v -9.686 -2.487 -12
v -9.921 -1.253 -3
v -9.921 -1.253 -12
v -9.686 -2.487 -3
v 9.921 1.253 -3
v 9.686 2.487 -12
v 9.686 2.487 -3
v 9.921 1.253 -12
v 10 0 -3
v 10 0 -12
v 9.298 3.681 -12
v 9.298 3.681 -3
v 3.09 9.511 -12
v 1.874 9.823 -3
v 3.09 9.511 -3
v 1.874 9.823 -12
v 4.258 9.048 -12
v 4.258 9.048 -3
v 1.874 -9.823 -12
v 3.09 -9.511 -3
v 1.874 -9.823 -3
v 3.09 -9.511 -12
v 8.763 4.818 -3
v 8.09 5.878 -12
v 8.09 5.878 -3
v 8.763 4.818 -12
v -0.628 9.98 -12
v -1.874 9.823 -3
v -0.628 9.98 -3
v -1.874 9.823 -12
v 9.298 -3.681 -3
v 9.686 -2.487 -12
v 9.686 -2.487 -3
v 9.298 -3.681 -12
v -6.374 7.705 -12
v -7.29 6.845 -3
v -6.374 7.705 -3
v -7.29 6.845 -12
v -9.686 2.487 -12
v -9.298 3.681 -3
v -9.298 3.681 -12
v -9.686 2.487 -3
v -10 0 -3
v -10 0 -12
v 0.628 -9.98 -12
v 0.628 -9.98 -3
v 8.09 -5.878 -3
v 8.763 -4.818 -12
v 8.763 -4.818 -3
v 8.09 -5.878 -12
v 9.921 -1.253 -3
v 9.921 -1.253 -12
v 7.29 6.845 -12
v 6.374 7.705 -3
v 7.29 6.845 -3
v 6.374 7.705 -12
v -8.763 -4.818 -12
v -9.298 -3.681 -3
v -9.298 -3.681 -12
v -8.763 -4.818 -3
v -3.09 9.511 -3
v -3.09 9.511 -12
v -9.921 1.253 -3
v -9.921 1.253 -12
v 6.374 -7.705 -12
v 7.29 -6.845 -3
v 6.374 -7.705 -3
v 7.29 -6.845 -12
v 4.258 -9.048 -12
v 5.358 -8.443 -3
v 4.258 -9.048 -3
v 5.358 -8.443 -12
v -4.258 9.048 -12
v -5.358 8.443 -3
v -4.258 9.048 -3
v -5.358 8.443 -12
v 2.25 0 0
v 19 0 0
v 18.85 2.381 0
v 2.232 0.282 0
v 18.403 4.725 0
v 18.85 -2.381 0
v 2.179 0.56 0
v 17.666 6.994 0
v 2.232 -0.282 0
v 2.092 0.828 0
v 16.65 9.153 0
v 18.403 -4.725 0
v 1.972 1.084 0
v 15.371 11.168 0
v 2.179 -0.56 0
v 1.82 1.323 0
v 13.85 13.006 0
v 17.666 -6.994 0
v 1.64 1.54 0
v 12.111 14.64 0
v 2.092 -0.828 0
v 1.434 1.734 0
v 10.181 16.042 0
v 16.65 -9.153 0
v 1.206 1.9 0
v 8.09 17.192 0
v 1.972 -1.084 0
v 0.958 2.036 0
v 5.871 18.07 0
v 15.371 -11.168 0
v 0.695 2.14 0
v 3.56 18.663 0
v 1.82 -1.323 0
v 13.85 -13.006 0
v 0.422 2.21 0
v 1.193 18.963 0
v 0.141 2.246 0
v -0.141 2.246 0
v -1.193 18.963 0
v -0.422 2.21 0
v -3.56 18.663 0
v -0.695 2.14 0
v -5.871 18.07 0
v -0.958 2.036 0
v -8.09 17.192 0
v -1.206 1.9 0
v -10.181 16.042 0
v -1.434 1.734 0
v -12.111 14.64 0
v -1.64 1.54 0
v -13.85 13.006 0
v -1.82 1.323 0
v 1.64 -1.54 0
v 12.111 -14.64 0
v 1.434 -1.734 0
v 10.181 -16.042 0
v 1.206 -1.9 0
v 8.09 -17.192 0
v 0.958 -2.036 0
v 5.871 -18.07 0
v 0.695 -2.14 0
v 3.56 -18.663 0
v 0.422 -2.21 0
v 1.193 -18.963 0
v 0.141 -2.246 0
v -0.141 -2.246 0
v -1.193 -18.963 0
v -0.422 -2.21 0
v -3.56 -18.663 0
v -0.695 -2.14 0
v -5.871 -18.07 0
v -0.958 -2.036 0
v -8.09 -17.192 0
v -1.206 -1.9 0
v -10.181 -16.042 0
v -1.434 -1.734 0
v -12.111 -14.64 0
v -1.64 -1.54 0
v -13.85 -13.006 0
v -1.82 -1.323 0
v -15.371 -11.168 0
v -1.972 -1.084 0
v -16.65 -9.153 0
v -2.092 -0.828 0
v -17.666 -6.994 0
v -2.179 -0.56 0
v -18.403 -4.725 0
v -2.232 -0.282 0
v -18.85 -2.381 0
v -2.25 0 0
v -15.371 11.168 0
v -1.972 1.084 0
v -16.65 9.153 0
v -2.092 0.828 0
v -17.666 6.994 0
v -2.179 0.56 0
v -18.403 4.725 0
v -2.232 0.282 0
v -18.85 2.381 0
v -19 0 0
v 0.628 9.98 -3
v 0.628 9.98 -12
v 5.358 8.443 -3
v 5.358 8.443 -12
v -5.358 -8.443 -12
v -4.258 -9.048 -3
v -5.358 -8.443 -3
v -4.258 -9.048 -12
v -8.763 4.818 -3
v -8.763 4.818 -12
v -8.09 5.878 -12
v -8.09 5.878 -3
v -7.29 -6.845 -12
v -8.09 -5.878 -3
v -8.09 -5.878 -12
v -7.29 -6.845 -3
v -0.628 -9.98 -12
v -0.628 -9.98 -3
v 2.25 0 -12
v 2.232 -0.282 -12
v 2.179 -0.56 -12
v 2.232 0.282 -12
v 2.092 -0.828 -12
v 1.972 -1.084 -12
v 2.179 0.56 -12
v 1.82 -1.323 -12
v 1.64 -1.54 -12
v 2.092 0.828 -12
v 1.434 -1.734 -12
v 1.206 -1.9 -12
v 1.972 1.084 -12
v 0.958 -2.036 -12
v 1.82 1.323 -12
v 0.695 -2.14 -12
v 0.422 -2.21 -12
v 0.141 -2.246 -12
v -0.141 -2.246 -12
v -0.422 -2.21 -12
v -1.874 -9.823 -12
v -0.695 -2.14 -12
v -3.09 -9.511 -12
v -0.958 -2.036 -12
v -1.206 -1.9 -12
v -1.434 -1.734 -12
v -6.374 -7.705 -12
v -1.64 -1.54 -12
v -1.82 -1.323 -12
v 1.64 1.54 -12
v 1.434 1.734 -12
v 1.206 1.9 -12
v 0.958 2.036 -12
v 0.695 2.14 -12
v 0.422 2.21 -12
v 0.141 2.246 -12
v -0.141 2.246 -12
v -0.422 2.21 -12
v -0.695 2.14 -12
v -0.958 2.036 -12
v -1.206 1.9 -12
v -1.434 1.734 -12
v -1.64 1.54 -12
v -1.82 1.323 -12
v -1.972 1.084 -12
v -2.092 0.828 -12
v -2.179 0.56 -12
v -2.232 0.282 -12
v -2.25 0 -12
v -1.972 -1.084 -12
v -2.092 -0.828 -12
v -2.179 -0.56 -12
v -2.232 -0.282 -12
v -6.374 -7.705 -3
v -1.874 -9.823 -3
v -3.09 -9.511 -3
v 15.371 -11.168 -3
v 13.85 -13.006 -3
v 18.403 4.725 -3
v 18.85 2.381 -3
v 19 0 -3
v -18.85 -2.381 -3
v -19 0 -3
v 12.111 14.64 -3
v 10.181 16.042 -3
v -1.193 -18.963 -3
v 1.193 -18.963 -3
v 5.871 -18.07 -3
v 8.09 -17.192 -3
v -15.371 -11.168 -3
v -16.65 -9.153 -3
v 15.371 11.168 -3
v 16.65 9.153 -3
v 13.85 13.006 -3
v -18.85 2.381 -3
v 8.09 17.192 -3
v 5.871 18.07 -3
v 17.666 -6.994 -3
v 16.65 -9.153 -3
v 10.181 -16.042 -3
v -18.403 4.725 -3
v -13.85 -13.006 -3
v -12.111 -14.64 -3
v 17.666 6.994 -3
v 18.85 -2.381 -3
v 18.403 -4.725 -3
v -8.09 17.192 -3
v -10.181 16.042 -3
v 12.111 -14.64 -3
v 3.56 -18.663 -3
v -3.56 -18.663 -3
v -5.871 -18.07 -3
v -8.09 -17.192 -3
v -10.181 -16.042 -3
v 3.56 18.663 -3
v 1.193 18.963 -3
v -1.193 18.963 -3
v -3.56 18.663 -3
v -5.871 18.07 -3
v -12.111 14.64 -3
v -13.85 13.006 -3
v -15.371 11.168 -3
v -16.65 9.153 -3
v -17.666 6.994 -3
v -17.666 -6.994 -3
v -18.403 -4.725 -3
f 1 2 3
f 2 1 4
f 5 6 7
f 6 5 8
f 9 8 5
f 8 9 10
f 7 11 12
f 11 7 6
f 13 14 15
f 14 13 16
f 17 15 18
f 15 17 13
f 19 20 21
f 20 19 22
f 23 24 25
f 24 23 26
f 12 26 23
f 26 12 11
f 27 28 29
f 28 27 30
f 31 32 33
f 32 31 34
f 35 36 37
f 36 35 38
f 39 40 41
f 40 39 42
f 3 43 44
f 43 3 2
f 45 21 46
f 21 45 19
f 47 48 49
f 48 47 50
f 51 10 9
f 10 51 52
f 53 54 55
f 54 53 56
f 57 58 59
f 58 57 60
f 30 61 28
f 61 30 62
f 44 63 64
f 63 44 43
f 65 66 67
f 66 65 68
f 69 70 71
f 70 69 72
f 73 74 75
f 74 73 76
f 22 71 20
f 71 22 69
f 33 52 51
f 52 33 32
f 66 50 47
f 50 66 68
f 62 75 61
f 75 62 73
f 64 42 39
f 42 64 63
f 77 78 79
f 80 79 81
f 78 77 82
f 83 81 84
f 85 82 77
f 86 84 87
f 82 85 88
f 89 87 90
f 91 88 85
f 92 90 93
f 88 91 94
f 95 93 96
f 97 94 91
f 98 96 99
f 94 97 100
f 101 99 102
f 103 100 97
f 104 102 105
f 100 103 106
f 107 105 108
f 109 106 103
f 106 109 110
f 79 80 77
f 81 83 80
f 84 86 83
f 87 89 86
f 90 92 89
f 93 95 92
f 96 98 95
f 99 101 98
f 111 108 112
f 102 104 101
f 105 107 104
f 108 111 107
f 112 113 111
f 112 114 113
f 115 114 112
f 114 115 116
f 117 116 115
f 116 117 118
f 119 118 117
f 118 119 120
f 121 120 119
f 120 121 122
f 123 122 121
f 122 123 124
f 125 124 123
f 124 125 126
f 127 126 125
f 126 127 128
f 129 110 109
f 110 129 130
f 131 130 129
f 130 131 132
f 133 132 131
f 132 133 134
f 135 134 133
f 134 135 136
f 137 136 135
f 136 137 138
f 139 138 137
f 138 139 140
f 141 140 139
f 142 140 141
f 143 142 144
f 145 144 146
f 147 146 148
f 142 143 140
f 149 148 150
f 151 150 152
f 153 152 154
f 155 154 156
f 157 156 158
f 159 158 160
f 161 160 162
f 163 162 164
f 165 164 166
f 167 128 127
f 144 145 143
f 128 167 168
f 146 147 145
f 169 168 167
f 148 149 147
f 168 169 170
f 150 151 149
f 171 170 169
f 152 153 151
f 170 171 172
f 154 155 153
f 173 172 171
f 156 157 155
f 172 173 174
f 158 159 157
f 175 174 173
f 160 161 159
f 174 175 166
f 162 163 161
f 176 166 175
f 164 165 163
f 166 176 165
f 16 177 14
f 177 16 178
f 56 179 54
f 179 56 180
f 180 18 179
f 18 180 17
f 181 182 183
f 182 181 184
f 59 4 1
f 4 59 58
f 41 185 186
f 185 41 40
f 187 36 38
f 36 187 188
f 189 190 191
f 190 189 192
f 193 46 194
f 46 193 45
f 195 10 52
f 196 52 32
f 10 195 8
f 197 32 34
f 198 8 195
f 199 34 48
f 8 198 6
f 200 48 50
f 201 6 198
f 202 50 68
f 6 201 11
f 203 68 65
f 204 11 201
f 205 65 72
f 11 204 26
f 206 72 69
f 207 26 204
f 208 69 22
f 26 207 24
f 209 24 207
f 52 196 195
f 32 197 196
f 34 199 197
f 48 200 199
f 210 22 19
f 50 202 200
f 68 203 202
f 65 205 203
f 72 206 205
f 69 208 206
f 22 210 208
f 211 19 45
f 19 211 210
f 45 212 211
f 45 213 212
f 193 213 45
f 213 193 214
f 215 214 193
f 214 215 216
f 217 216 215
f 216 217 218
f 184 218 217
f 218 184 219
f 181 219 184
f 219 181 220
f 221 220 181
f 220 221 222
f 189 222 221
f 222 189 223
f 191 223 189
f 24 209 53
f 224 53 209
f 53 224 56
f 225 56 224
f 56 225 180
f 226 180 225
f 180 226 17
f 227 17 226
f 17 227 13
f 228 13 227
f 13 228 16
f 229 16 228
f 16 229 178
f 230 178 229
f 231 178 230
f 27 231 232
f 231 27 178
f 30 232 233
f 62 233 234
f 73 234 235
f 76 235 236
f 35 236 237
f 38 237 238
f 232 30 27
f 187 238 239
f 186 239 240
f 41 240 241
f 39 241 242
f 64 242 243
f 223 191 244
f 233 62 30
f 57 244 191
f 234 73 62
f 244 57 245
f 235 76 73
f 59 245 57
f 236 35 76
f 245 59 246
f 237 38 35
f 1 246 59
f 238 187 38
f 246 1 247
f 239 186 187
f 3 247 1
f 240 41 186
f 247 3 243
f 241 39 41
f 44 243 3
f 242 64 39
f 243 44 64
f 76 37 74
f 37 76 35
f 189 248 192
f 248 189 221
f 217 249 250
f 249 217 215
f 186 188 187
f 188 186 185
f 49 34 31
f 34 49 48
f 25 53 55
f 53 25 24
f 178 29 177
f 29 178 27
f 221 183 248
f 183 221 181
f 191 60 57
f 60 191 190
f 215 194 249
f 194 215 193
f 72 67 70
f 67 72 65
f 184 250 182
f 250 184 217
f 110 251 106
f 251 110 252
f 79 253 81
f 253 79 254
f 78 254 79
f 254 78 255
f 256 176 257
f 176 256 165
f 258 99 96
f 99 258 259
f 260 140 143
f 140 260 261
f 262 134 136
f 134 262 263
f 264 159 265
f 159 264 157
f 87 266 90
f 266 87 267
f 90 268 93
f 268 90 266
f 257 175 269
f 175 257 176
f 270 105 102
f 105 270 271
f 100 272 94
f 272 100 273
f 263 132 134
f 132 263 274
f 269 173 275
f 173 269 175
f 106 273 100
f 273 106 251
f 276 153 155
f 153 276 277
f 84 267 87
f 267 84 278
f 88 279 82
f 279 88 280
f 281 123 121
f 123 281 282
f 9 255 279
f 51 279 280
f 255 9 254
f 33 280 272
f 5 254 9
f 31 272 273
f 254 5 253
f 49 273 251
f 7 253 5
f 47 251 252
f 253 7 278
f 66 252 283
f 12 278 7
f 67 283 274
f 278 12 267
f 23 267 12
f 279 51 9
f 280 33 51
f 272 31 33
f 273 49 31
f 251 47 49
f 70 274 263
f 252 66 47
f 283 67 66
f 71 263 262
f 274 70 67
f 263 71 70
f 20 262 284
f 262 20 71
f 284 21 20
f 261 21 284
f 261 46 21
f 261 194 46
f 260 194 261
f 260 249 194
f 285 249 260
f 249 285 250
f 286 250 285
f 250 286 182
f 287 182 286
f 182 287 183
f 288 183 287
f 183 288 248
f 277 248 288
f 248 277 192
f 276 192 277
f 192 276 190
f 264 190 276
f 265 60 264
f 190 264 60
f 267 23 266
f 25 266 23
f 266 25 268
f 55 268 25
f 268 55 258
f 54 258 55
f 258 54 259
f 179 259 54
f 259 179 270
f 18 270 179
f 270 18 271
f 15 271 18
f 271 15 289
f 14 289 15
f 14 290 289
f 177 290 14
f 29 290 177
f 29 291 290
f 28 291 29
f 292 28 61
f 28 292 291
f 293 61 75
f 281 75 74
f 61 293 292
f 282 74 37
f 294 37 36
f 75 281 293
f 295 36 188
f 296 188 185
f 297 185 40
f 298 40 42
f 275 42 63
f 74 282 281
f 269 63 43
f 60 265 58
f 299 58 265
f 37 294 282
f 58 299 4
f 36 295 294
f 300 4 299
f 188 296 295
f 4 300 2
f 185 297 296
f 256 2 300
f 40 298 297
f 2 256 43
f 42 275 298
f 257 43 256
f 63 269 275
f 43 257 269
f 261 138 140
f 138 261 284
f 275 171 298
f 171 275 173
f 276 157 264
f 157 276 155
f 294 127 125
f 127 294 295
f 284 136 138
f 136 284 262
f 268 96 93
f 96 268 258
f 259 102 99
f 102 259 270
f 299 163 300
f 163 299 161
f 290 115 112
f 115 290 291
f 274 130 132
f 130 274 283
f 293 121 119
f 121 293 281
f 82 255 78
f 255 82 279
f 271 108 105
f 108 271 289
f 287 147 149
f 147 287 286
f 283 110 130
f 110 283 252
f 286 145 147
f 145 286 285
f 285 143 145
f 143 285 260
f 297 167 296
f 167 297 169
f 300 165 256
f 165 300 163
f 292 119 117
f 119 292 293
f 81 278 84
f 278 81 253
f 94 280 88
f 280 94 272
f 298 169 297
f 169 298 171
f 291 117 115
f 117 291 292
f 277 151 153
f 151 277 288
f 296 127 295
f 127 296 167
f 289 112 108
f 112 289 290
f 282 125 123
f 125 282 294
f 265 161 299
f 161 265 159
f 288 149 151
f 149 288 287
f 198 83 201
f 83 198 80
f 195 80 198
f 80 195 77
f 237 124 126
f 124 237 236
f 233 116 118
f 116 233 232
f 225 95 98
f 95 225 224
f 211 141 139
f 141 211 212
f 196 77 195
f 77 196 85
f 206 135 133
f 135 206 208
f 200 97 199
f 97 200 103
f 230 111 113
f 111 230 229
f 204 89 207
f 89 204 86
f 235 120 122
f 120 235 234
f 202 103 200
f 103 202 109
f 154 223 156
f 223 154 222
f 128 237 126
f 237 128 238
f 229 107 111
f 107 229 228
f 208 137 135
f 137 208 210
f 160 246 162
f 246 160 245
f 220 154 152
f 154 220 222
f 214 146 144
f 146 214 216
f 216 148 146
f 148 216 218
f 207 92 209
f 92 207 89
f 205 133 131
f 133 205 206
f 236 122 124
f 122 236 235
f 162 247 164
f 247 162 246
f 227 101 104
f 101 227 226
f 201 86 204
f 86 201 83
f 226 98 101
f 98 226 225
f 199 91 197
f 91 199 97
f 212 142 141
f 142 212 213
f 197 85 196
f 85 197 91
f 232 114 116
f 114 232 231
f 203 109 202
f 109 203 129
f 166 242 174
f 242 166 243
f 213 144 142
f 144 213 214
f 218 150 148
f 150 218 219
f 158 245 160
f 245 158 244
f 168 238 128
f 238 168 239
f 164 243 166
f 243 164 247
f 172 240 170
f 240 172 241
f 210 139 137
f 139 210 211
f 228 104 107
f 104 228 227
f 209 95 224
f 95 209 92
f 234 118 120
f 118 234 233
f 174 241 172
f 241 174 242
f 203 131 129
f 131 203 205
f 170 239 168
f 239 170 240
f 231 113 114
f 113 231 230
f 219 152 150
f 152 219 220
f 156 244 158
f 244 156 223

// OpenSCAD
$fn = 50;


difference() {
	union() {
		translate(v = [0, 0, -12.0000000000]) {
			cylinder(h = 12, r = 10.0000000000);
		}
		translate(v = [0, 0, -3.0000000000]) {
			cylinder(h = 3, r = 19.0000000000);
		}
	}
	union() {
		#translate(v = [0, 0, -12]) {
			cylinder(h = 12, r = 2.2500000000);
		}
	}
}
